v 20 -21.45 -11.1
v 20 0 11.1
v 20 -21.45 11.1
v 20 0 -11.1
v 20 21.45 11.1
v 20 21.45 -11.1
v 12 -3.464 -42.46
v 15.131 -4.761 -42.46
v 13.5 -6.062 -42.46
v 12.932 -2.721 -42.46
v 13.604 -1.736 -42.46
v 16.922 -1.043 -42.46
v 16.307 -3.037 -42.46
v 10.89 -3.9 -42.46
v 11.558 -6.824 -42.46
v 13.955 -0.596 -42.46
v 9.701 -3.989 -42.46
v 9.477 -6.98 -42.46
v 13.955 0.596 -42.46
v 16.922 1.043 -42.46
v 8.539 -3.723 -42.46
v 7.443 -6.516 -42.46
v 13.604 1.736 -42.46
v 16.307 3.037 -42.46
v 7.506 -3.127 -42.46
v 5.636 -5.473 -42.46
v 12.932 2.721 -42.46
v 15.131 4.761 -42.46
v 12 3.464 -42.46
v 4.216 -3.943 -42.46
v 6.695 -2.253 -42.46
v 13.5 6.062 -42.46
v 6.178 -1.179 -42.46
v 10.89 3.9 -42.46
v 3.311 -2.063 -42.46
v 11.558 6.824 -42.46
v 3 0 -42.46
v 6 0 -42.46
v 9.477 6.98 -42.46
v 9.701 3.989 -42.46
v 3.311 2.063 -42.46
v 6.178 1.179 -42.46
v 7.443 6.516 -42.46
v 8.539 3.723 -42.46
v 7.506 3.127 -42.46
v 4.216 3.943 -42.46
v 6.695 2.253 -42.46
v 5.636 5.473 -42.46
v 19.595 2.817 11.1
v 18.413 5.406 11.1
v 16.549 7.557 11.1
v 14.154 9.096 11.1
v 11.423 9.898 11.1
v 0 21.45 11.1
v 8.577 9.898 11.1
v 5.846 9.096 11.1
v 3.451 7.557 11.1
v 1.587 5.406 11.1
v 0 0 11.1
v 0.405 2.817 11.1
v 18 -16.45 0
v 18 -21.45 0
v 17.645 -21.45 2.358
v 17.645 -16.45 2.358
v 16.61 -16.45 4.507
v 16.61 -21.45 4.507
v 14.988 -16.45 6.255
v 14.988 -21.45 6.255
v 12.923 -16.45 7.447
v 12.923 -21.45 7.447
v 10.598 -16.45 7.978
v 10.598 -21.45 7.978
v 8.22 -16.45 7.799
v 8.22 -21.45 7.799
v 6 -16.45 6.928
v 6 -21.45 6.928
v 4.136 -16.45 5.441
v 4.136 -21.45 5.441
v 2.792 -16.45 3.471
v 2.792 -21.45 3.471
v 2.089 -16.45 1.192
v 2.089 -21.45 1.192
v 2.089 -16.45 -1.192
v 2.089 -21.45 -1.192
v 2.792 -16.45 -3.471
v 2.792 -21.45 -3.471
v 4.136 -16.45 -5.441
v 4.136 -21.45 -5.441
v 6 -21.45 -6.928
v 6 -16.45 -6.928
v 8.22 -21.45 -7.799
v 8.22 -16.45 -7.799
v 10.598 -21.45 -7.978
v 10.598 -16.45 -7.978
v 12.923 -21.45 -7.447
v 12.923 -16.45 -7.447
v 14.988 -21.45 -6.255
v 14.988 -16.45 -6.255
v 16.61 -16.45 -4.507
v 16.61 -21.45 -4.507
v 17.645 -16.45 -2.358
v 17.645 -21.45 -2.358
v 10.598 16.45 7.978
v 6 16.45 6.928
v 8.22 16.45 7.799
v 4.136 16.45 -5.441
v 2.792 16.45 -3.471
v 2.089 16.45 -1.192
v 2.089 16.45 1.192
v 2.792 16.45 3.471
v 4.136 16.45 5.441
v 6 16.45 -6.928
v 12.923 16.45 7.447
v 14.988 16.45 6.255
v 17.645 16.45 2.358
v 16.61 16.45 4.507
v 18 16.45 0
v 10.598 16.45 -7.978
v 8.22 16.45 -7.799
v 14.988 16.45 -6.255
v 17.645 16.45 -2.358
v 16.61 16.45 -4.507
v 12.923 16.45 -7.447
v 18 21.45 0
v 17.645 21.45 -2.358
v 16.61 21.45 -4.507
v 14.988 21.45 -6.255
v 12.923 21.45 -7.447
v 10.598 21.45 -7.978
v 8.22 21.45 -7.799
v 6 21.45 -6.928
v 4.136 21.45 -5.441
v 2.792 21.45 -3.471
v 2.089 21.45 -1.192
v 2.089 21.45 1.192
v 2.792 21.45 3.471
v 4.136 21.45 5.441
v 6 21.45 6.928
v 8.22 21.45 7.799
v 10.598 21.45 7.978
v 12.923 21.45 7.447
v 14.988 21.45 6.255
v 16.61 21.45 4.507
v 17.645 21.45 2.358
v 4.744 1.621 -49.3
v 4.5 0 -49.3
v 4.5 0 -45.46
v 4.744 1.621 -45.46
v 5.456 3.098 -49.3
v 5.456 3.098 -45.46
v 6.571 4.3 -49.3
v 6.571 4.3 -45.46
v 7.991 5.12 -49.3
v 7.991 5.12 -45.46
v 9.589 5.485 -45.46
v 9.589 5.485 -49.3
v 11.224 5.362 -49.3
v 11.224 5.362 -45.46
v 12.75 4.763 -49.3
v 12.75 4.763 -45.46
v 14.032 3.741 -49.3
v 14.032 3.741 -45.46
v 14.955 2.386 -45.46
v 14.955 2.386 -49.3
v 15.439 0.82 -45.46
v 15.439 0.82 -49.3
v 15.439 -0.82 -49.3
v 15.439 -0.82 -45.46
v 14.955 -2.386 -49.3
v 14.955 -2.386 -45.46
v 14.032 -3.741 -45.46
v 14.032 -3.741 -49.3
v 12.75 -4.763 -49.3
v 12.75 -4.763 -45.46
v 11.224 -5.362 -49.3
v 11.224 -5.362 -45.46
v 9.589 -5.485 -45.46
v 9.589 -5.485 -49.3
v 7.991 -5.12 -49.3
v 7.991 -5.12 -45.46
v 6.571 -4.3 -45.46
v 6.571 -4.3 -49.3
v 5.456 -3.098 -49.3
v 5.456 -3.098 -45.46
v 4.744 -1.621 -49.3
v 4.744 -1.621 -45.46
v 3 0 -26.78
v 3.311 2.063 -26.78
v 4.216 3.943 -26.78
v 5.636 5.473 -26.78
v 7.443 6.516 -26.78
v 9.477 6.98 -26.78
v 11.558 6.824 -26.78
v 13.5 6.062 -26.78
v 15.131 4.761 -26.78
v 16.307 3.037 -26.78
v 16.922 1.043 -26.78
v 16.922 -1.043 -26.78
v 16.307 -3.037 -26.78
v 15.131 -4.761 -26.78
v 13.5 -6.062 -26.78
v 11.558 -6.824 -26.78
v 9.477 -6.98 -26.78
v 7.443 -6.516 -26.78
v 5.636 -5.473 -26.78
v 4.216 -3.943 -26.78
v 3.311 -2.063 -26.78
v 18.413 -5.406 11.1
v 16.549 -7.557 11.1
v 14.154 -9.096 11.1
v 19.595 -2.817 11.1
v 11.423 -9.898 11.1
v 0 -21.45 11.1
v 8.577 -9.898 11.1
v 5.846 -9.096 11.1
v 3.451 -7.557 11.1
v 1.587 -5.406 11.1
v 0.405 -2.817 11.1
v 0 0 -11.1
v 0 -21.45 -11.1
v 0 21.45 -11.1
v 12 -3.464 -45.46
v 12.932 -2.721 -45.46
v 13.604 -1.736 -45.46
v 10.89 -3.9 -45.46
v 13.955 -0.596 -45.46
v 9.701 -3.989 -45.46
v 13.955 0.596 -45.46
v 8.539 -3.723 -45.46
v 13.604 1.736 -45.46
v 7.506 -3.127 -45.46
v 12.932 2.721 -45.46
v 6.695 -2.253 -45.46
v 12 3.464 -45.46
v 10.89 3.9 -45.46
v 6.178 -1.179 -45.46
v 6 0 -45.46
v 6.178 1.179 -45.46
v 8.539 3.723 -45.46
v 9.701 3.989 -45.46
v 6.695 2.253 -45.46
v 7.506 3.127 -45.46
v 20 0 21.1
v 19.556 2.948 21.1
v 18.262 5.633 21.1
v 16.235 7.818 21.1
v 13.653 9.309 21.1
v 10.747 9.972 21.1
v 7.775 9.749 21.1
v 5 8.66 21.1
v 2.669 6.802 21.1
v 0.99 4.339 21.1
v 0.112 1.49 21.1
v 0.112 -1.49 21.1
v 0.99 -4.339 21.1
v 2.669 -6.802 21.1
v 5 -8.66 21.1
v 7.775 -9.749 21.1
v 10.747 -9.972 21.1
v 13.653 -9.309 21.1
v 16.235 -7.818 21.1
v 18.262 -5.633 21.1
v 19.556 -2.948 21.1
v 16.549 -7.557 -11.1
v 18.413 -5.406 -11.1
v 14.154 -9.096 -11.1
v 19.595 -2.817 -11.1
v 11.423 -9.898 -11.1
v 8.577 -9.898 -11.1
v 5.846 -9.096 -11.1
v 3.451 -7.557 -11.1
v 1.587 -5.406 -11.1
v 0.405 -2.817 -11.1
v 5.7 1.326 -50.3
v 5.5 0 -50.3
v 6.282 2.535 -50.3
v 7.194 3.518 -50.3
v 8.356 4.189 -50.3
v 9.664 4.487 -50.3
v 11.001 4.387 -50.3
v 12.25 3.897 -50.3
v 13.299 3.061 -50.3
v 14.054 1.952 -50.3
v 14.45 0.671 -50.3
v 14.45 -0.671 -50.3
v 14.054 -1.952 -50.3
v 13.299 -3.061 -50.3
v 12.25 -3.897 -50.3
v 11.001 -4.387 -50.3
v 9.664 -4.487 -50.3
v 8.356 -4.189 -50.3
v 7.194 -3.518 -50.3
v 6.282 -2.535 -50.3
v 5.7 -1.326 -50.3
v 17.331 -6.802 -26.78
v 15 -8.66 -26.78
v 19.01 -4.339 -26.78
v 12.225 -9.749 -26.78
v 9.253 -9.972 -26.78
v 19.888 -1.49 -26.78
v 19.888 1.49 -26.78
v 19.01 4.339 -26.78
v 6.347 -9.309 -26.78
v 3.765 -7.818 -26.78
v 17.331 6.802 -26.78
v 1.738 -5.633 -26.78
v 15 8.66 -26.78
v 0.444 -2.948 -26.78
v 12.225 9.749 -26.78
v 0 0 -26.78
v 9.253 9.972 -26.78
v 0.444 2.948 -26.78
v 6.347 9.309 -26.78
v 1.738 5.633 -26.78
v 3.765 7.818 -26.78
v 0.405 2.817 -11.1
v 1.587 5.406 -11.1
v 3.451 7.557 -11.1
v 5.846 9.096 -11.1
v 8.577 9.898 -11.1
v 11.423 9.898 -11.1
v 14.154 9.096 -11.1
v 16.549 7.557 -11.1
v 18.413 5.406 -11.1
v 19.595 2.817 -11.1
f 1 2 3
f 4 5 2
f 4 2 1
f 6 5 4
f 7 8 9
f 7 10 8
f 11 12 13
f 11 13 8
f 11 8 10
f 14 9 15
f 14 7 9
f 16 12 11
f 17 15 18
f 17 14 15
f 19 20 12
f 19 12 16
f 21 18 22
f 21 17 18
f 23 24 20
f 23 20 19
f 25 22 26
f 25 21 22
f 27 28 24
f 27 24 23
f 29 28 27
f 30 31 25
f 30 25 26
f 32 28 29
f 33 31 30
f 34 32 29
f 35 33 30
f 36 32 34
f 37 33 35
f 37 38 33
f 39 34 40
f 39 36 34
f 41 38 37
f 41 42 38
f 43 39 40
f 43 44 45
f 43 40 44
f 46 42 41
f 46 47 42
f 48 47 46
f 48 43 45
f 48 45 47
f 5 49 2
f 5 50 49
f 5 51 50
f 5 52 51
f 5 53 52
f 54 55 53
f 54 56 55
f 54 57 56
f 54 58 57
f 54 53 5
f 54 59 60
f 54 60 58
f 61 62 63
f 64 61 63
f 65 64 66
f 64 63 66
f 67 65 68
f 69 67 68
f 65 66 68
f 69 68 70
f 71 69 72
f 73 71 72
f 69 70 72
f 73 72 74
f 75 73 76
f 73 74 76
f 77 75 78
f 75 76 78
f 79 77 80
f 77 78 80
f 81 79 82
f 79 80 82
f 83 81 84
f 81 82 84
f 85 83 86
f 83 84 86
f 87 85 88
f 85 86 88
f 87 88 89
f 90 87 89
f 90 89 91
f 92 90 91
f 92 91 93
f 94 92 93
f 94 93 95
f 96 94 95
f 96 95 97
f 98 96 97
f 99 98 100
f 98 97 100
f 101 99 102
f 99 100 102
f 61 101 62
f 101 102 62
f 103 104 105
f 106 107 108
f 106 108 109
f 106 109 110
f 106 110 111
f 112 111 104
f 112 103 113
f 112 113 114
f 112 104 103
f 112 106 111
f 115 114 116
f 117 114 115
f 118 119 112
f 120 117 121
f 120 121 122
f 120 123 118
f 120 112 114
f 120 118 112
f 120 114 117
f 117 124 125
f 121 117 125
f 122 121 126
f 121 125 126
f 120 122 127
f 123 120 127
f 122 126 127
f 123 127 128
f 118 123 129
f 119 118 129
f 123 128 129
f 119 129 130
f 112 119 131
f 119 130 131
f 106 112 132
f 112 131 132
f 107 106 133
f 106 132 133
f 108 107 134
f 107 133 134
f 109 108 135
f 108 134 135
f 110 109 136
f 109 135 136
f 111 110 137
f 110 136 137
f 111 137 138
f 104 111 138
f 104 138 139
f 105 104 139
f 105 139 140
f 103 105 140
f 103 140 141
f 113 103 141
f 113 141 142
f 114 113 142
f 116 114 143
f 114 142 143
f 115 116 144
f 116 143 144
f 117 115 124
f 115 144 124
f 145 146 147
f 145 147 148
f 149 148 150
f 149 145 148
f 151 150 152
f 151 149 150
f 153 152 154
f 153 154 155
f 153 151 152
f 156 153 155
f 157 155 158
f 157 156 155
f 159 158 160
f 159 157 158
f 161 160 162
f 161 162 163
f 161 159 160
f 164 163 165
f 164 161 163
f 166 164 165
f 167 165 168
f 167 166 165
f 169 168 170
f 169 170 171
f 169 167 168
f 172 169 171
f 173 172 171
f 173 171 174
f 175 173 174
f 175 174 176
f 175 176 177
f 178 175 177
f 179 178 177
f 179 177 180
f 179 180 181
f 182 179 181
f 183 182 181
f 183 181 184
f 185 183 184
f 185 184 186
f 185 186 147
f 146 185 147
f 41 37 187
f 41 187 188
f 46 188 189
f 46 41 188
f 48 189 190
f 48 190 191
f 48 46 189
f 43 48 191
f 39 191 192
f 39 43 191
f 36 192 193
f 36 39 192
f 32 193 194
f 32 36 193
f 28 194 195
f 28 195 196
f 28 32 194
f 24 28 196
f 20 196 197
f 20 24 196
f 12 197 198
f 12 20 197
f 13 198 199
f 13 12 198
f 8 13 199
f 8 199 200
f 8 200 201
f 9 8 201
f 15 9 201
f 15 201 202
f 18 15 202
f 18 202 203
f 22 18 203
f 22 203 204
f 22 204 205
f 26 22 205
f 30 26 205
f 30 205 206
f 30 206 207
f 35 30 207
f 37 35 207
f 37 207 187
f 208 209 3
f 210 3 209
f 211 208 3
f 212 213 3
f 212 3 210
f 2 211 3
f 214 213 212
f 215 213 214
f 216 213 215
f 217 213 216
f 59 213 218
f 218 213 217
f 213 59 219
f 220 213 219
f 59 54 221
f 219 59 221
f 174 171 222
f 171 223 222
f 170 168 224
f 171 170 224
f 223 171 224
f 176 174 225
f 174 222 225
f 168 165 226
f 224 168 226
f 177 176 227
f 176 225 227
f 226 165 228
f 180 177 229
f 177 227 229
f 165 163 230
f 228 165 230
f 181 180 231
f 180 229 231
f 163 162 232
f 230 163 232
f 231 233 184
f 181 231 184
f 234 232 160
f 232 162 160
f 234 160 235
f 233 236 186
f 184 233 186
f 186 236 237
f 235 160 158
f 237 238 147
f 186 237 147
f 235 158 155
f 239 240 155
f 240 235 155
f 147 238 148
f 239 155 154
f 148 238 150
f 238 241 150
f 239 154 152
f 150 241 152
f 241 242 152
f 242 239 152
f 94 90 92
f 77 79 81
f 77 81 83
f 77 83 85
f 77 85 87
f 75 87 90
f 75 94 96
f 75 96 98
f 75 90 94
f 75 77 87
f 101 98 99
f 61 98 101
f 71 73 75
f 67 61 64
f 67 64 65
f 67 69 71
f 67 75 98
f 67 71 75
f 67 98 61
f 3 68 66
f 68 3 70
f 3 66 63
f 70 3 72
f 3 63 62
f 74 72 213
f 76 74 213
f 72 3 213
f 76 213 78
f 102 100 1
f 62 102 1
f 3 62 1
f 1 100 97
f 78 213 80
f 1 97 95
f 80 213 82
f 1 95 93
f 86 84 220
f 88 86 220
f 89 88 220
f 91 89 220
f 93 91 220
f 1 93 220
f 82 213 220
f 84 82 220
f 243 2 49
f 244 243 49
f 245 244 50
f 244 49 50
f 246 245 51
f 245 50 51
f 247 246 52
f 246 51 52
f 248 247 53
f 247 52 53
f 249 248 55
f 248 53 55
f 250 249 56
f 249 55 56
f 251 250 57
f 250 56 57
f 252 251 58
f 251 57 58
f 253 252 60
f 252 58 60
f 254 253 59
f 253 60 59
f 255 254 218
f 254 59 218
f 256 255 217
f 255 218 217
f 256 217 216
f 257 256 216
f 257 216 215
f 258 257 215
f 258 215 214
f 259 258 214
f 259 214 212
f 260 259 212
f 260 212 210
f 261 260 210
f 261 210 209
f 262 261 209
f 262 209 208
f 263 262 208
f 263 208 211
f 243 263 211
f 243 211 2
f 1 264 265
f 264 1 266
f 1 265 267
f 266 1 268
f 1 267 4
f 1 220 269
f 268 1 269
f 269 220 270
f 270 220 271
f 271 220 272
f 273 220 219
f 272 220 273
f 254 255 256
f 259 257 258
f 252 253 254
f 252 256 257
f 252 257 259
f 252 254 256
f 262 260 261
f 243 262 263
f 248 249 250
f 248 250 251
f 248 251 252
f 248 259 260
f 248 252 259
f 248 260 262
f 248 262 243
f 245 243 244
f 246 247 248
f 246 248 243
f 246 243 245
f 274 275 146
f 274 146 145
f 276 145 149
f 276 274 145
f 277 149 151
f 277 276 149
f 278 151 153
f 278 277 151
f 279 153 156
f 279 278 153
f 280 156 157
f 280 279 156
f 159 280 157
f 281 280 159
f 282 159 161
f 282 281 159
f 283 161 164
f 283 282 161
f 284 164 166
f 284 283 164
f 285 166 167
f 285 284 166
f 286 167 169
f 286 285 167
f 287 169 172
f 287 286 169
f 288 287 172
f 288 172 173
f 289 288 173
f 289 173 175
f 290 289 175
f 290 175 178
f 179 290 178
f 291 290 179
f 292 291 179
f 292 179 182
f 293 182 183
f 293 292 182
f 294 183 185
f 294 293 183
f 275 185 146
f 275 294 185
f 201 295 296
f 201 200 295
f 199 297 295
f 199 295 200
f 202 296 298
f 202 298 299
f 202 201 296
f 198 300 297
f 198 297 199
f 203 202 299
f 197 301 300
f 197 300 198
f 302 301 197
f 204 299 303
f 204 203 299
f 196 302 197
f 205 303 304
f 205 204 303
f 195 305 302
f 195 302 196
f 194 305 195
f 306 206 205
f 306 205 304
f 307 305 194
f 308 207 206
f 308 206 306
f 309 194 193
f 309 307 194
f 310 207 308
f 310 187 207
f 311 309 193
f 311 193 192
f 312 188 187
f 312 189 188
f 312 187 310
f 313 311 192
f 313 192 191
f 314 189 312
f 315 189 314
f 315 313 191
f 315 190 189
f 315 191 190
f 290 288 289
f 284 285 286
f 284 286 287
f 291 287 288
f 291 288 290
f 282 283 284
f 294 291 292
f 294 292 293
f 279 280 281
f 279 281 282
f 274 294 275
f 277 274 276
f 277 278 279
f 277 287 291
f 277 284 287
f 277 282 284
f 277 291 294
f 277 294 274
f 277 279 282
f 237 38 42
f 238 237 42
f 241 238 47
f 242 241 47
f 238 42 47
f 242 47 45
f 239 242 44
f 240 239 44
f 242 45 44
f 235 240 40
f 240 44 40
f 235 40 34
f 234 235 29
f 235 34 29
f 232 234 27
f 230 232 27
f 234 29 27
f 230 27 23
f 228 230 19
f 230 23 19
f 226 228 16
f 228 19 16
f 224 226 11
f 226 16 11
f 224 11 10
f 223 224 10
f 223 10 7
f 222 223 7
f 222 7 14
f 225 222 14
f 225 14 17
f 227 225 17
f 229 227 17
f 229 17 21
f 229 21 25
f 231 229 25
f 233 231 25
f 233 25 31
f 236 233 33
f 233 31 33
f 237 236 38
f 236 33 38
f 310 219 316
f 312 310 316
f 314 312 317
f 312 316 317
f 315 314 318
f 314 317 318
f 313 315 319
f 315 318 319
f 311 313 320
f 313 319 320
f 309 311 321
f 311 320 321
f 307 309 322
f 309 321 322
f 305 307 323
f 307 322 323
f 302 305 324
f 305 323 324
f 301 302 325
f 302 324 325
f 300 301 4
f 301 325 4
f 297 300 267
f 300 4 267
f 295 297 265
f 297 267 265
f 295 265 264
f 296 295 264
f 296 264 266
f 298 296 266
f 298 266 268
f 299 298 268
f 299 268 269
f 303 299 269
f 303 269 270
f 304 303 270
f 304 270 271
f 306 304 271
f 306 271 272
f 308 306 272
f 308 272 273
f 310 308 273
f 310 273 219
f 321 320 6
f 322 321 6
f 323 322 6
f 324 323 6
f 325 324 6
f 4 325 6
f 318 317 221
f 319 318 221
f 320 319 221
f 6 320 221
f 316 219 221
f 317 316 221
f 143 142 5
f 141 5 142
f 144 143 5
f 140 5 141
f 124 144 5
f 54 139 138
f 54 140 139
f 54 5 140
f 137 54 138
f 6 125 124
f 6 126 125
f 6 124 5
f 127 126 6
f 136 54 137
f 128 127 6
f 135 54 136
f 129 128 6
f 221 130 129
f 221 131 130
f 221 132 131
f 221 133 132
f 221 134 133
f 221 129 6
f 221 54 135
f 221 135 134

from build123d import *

# Parameters (mm, degrees)
SKETCH3_W           = 22.2
SKETCH3_H           = 42.9
BOSS_EXTRUDE2_DEPTH = 20
SKETCH4_R           = 8
CUT_EXTRUDE1_DEPTH  = 5
SKETCH5_R           = 8
CUT_EXTRUDE2_DEPTH  = 5
SKETCH11_R          = 10
BOSS_EXTRUDE3_DEPTH = 39.2
SKETCH13_R          = 10
SKETCH13_R_2        = 7
CUT_EXTRUDE5_DEPTH  = 23.52
SKETCH14_R          = 7
SKETCH14_R_2        = 5.5
CUT_EXTRUDE6_DEPTH  = 7.84
CHAMFER2_SIZE       = 1
SKETCH15_R          = 5.5
SKETCH15_R_2        = 4
CUT_EXTRUDE7_DEPTH  = 3
SKETCH16_R          = 10
BOSS_EXTRUDE4_DEPTH = 10


with BuildPart() as part:
    # Sketch3 → Boss-Extrude2 (new body)
    with BuildSketch(Plane(origin=(0, 0, 0), x_dir=(0, 0, -1), z_dir=(1, 0, 0))):
        Rectangle(SKETCH3_W, SKETCH3_H)
    extrude(amount=BOSS_EXTRUDE2_DEPTH)

    # Sketch4 → Cut-Extrude1 (cut)
    with BuildSketch(Plane(origin=(0, 21.45, 0), x_dir=(1, 0, 0), z_dir=(0, 1, 0))):
        with Locations((10, 0)):
            Circle(SKETCH4_R)
    extrude(amount=-CUT_EXTRUDE1_DEPTH, mode=Mode.SUBTRACT)

    # Sketch5 → Cut-Extrude2 (cut)
    with BuildSketch(Plane.XZ.offset(21.45)):
        with Locations((10, 0)):
            Circle(SKETCH5_R)
    extrude(amount=-CUT_EXTRUDE2_DEPTH, mode=Mode.SUBTRACT)

    # Sketch11 → Boss-Extrude3 (add)
    with BuildSketch(Plane(origin=(0, 0, -11.1), x_dir=(-1, 0, 0), z_dir=(0, 0, -1))):
        with Locations((-10, 0)):
            Circle(SKETCH11_R)
    extrude(amount=BOSS_EXTRUDE3_DEPTH)

    # Sketch13 → Cut-Extrude5 (cut)
    with BuildSketch(Plane(origin=(0, 0, -50.3), x_dir=(-1, 0, 0), z_dir=(0, 0, -1))):
        with Locations((-10, 0)):
            Circle(SKETCH13_R)
        with Locations((-10, 0)):
            Circle(SKETCH13_R_2, mode=Mode.SUBTRACT)
    extrude(amount=-CUT_EXTRUDE5_DEPTH, mode=Mode.SUBTRACT)

    # Sketch14 → Cut-Extrude6 (cut)
    with BuildSketch(Plane(origin=(0, 0, -50.3), x_dir=(-1, 0, 0), z_dir=(0, 0, -1))):
        with Locations((-10, 0)):
            Circle(SKETCH14_R)
        with Locations((-10, 0)):
            Circle(SKETCH14_R_2, mode=Mode.SUBTRACT)
    extrude(amount=-CUT_EXTRUDE6_DEPTH, mode=Mode.SUBTRACT)

    # Chamfer2
    chamfer2_edges = [part.edges().sort_by_distance(p)[0] for p in [
        (15.5, 0, -50.3),
    ]]
    chamfer(chamfer2_edges, length=CHAMFER2_SIZE)

    # Sketch15 → Cut-Extrude7 (cut)
    with BuildSketch(Plane(origin=(0, 0, -42.46), x_dir=(-1, 0, 0), z_dir=(0, 0, -1))):
        with Locations((-10, 0)):
            Circle(SKETCH15_R)
        with Locations((-10, 0)):
            Circle(SKETCH15_R_2, mode=Mode.SUBTRACT)
    extrude(amount=CUT_EXTRUDE7_DEPTH, mode=Mode.SUBTRACT)

    # Sketch16 → Boss-Extrude4 (add)
    with BuildSketch(Plane.XY.offset(11.1)):
        with Locations((10, 0)):
            Circle(SKETCH16_R)
    extrude(amount=BOSS_EXTRUDE4_DEPTH)


solid = part.part
